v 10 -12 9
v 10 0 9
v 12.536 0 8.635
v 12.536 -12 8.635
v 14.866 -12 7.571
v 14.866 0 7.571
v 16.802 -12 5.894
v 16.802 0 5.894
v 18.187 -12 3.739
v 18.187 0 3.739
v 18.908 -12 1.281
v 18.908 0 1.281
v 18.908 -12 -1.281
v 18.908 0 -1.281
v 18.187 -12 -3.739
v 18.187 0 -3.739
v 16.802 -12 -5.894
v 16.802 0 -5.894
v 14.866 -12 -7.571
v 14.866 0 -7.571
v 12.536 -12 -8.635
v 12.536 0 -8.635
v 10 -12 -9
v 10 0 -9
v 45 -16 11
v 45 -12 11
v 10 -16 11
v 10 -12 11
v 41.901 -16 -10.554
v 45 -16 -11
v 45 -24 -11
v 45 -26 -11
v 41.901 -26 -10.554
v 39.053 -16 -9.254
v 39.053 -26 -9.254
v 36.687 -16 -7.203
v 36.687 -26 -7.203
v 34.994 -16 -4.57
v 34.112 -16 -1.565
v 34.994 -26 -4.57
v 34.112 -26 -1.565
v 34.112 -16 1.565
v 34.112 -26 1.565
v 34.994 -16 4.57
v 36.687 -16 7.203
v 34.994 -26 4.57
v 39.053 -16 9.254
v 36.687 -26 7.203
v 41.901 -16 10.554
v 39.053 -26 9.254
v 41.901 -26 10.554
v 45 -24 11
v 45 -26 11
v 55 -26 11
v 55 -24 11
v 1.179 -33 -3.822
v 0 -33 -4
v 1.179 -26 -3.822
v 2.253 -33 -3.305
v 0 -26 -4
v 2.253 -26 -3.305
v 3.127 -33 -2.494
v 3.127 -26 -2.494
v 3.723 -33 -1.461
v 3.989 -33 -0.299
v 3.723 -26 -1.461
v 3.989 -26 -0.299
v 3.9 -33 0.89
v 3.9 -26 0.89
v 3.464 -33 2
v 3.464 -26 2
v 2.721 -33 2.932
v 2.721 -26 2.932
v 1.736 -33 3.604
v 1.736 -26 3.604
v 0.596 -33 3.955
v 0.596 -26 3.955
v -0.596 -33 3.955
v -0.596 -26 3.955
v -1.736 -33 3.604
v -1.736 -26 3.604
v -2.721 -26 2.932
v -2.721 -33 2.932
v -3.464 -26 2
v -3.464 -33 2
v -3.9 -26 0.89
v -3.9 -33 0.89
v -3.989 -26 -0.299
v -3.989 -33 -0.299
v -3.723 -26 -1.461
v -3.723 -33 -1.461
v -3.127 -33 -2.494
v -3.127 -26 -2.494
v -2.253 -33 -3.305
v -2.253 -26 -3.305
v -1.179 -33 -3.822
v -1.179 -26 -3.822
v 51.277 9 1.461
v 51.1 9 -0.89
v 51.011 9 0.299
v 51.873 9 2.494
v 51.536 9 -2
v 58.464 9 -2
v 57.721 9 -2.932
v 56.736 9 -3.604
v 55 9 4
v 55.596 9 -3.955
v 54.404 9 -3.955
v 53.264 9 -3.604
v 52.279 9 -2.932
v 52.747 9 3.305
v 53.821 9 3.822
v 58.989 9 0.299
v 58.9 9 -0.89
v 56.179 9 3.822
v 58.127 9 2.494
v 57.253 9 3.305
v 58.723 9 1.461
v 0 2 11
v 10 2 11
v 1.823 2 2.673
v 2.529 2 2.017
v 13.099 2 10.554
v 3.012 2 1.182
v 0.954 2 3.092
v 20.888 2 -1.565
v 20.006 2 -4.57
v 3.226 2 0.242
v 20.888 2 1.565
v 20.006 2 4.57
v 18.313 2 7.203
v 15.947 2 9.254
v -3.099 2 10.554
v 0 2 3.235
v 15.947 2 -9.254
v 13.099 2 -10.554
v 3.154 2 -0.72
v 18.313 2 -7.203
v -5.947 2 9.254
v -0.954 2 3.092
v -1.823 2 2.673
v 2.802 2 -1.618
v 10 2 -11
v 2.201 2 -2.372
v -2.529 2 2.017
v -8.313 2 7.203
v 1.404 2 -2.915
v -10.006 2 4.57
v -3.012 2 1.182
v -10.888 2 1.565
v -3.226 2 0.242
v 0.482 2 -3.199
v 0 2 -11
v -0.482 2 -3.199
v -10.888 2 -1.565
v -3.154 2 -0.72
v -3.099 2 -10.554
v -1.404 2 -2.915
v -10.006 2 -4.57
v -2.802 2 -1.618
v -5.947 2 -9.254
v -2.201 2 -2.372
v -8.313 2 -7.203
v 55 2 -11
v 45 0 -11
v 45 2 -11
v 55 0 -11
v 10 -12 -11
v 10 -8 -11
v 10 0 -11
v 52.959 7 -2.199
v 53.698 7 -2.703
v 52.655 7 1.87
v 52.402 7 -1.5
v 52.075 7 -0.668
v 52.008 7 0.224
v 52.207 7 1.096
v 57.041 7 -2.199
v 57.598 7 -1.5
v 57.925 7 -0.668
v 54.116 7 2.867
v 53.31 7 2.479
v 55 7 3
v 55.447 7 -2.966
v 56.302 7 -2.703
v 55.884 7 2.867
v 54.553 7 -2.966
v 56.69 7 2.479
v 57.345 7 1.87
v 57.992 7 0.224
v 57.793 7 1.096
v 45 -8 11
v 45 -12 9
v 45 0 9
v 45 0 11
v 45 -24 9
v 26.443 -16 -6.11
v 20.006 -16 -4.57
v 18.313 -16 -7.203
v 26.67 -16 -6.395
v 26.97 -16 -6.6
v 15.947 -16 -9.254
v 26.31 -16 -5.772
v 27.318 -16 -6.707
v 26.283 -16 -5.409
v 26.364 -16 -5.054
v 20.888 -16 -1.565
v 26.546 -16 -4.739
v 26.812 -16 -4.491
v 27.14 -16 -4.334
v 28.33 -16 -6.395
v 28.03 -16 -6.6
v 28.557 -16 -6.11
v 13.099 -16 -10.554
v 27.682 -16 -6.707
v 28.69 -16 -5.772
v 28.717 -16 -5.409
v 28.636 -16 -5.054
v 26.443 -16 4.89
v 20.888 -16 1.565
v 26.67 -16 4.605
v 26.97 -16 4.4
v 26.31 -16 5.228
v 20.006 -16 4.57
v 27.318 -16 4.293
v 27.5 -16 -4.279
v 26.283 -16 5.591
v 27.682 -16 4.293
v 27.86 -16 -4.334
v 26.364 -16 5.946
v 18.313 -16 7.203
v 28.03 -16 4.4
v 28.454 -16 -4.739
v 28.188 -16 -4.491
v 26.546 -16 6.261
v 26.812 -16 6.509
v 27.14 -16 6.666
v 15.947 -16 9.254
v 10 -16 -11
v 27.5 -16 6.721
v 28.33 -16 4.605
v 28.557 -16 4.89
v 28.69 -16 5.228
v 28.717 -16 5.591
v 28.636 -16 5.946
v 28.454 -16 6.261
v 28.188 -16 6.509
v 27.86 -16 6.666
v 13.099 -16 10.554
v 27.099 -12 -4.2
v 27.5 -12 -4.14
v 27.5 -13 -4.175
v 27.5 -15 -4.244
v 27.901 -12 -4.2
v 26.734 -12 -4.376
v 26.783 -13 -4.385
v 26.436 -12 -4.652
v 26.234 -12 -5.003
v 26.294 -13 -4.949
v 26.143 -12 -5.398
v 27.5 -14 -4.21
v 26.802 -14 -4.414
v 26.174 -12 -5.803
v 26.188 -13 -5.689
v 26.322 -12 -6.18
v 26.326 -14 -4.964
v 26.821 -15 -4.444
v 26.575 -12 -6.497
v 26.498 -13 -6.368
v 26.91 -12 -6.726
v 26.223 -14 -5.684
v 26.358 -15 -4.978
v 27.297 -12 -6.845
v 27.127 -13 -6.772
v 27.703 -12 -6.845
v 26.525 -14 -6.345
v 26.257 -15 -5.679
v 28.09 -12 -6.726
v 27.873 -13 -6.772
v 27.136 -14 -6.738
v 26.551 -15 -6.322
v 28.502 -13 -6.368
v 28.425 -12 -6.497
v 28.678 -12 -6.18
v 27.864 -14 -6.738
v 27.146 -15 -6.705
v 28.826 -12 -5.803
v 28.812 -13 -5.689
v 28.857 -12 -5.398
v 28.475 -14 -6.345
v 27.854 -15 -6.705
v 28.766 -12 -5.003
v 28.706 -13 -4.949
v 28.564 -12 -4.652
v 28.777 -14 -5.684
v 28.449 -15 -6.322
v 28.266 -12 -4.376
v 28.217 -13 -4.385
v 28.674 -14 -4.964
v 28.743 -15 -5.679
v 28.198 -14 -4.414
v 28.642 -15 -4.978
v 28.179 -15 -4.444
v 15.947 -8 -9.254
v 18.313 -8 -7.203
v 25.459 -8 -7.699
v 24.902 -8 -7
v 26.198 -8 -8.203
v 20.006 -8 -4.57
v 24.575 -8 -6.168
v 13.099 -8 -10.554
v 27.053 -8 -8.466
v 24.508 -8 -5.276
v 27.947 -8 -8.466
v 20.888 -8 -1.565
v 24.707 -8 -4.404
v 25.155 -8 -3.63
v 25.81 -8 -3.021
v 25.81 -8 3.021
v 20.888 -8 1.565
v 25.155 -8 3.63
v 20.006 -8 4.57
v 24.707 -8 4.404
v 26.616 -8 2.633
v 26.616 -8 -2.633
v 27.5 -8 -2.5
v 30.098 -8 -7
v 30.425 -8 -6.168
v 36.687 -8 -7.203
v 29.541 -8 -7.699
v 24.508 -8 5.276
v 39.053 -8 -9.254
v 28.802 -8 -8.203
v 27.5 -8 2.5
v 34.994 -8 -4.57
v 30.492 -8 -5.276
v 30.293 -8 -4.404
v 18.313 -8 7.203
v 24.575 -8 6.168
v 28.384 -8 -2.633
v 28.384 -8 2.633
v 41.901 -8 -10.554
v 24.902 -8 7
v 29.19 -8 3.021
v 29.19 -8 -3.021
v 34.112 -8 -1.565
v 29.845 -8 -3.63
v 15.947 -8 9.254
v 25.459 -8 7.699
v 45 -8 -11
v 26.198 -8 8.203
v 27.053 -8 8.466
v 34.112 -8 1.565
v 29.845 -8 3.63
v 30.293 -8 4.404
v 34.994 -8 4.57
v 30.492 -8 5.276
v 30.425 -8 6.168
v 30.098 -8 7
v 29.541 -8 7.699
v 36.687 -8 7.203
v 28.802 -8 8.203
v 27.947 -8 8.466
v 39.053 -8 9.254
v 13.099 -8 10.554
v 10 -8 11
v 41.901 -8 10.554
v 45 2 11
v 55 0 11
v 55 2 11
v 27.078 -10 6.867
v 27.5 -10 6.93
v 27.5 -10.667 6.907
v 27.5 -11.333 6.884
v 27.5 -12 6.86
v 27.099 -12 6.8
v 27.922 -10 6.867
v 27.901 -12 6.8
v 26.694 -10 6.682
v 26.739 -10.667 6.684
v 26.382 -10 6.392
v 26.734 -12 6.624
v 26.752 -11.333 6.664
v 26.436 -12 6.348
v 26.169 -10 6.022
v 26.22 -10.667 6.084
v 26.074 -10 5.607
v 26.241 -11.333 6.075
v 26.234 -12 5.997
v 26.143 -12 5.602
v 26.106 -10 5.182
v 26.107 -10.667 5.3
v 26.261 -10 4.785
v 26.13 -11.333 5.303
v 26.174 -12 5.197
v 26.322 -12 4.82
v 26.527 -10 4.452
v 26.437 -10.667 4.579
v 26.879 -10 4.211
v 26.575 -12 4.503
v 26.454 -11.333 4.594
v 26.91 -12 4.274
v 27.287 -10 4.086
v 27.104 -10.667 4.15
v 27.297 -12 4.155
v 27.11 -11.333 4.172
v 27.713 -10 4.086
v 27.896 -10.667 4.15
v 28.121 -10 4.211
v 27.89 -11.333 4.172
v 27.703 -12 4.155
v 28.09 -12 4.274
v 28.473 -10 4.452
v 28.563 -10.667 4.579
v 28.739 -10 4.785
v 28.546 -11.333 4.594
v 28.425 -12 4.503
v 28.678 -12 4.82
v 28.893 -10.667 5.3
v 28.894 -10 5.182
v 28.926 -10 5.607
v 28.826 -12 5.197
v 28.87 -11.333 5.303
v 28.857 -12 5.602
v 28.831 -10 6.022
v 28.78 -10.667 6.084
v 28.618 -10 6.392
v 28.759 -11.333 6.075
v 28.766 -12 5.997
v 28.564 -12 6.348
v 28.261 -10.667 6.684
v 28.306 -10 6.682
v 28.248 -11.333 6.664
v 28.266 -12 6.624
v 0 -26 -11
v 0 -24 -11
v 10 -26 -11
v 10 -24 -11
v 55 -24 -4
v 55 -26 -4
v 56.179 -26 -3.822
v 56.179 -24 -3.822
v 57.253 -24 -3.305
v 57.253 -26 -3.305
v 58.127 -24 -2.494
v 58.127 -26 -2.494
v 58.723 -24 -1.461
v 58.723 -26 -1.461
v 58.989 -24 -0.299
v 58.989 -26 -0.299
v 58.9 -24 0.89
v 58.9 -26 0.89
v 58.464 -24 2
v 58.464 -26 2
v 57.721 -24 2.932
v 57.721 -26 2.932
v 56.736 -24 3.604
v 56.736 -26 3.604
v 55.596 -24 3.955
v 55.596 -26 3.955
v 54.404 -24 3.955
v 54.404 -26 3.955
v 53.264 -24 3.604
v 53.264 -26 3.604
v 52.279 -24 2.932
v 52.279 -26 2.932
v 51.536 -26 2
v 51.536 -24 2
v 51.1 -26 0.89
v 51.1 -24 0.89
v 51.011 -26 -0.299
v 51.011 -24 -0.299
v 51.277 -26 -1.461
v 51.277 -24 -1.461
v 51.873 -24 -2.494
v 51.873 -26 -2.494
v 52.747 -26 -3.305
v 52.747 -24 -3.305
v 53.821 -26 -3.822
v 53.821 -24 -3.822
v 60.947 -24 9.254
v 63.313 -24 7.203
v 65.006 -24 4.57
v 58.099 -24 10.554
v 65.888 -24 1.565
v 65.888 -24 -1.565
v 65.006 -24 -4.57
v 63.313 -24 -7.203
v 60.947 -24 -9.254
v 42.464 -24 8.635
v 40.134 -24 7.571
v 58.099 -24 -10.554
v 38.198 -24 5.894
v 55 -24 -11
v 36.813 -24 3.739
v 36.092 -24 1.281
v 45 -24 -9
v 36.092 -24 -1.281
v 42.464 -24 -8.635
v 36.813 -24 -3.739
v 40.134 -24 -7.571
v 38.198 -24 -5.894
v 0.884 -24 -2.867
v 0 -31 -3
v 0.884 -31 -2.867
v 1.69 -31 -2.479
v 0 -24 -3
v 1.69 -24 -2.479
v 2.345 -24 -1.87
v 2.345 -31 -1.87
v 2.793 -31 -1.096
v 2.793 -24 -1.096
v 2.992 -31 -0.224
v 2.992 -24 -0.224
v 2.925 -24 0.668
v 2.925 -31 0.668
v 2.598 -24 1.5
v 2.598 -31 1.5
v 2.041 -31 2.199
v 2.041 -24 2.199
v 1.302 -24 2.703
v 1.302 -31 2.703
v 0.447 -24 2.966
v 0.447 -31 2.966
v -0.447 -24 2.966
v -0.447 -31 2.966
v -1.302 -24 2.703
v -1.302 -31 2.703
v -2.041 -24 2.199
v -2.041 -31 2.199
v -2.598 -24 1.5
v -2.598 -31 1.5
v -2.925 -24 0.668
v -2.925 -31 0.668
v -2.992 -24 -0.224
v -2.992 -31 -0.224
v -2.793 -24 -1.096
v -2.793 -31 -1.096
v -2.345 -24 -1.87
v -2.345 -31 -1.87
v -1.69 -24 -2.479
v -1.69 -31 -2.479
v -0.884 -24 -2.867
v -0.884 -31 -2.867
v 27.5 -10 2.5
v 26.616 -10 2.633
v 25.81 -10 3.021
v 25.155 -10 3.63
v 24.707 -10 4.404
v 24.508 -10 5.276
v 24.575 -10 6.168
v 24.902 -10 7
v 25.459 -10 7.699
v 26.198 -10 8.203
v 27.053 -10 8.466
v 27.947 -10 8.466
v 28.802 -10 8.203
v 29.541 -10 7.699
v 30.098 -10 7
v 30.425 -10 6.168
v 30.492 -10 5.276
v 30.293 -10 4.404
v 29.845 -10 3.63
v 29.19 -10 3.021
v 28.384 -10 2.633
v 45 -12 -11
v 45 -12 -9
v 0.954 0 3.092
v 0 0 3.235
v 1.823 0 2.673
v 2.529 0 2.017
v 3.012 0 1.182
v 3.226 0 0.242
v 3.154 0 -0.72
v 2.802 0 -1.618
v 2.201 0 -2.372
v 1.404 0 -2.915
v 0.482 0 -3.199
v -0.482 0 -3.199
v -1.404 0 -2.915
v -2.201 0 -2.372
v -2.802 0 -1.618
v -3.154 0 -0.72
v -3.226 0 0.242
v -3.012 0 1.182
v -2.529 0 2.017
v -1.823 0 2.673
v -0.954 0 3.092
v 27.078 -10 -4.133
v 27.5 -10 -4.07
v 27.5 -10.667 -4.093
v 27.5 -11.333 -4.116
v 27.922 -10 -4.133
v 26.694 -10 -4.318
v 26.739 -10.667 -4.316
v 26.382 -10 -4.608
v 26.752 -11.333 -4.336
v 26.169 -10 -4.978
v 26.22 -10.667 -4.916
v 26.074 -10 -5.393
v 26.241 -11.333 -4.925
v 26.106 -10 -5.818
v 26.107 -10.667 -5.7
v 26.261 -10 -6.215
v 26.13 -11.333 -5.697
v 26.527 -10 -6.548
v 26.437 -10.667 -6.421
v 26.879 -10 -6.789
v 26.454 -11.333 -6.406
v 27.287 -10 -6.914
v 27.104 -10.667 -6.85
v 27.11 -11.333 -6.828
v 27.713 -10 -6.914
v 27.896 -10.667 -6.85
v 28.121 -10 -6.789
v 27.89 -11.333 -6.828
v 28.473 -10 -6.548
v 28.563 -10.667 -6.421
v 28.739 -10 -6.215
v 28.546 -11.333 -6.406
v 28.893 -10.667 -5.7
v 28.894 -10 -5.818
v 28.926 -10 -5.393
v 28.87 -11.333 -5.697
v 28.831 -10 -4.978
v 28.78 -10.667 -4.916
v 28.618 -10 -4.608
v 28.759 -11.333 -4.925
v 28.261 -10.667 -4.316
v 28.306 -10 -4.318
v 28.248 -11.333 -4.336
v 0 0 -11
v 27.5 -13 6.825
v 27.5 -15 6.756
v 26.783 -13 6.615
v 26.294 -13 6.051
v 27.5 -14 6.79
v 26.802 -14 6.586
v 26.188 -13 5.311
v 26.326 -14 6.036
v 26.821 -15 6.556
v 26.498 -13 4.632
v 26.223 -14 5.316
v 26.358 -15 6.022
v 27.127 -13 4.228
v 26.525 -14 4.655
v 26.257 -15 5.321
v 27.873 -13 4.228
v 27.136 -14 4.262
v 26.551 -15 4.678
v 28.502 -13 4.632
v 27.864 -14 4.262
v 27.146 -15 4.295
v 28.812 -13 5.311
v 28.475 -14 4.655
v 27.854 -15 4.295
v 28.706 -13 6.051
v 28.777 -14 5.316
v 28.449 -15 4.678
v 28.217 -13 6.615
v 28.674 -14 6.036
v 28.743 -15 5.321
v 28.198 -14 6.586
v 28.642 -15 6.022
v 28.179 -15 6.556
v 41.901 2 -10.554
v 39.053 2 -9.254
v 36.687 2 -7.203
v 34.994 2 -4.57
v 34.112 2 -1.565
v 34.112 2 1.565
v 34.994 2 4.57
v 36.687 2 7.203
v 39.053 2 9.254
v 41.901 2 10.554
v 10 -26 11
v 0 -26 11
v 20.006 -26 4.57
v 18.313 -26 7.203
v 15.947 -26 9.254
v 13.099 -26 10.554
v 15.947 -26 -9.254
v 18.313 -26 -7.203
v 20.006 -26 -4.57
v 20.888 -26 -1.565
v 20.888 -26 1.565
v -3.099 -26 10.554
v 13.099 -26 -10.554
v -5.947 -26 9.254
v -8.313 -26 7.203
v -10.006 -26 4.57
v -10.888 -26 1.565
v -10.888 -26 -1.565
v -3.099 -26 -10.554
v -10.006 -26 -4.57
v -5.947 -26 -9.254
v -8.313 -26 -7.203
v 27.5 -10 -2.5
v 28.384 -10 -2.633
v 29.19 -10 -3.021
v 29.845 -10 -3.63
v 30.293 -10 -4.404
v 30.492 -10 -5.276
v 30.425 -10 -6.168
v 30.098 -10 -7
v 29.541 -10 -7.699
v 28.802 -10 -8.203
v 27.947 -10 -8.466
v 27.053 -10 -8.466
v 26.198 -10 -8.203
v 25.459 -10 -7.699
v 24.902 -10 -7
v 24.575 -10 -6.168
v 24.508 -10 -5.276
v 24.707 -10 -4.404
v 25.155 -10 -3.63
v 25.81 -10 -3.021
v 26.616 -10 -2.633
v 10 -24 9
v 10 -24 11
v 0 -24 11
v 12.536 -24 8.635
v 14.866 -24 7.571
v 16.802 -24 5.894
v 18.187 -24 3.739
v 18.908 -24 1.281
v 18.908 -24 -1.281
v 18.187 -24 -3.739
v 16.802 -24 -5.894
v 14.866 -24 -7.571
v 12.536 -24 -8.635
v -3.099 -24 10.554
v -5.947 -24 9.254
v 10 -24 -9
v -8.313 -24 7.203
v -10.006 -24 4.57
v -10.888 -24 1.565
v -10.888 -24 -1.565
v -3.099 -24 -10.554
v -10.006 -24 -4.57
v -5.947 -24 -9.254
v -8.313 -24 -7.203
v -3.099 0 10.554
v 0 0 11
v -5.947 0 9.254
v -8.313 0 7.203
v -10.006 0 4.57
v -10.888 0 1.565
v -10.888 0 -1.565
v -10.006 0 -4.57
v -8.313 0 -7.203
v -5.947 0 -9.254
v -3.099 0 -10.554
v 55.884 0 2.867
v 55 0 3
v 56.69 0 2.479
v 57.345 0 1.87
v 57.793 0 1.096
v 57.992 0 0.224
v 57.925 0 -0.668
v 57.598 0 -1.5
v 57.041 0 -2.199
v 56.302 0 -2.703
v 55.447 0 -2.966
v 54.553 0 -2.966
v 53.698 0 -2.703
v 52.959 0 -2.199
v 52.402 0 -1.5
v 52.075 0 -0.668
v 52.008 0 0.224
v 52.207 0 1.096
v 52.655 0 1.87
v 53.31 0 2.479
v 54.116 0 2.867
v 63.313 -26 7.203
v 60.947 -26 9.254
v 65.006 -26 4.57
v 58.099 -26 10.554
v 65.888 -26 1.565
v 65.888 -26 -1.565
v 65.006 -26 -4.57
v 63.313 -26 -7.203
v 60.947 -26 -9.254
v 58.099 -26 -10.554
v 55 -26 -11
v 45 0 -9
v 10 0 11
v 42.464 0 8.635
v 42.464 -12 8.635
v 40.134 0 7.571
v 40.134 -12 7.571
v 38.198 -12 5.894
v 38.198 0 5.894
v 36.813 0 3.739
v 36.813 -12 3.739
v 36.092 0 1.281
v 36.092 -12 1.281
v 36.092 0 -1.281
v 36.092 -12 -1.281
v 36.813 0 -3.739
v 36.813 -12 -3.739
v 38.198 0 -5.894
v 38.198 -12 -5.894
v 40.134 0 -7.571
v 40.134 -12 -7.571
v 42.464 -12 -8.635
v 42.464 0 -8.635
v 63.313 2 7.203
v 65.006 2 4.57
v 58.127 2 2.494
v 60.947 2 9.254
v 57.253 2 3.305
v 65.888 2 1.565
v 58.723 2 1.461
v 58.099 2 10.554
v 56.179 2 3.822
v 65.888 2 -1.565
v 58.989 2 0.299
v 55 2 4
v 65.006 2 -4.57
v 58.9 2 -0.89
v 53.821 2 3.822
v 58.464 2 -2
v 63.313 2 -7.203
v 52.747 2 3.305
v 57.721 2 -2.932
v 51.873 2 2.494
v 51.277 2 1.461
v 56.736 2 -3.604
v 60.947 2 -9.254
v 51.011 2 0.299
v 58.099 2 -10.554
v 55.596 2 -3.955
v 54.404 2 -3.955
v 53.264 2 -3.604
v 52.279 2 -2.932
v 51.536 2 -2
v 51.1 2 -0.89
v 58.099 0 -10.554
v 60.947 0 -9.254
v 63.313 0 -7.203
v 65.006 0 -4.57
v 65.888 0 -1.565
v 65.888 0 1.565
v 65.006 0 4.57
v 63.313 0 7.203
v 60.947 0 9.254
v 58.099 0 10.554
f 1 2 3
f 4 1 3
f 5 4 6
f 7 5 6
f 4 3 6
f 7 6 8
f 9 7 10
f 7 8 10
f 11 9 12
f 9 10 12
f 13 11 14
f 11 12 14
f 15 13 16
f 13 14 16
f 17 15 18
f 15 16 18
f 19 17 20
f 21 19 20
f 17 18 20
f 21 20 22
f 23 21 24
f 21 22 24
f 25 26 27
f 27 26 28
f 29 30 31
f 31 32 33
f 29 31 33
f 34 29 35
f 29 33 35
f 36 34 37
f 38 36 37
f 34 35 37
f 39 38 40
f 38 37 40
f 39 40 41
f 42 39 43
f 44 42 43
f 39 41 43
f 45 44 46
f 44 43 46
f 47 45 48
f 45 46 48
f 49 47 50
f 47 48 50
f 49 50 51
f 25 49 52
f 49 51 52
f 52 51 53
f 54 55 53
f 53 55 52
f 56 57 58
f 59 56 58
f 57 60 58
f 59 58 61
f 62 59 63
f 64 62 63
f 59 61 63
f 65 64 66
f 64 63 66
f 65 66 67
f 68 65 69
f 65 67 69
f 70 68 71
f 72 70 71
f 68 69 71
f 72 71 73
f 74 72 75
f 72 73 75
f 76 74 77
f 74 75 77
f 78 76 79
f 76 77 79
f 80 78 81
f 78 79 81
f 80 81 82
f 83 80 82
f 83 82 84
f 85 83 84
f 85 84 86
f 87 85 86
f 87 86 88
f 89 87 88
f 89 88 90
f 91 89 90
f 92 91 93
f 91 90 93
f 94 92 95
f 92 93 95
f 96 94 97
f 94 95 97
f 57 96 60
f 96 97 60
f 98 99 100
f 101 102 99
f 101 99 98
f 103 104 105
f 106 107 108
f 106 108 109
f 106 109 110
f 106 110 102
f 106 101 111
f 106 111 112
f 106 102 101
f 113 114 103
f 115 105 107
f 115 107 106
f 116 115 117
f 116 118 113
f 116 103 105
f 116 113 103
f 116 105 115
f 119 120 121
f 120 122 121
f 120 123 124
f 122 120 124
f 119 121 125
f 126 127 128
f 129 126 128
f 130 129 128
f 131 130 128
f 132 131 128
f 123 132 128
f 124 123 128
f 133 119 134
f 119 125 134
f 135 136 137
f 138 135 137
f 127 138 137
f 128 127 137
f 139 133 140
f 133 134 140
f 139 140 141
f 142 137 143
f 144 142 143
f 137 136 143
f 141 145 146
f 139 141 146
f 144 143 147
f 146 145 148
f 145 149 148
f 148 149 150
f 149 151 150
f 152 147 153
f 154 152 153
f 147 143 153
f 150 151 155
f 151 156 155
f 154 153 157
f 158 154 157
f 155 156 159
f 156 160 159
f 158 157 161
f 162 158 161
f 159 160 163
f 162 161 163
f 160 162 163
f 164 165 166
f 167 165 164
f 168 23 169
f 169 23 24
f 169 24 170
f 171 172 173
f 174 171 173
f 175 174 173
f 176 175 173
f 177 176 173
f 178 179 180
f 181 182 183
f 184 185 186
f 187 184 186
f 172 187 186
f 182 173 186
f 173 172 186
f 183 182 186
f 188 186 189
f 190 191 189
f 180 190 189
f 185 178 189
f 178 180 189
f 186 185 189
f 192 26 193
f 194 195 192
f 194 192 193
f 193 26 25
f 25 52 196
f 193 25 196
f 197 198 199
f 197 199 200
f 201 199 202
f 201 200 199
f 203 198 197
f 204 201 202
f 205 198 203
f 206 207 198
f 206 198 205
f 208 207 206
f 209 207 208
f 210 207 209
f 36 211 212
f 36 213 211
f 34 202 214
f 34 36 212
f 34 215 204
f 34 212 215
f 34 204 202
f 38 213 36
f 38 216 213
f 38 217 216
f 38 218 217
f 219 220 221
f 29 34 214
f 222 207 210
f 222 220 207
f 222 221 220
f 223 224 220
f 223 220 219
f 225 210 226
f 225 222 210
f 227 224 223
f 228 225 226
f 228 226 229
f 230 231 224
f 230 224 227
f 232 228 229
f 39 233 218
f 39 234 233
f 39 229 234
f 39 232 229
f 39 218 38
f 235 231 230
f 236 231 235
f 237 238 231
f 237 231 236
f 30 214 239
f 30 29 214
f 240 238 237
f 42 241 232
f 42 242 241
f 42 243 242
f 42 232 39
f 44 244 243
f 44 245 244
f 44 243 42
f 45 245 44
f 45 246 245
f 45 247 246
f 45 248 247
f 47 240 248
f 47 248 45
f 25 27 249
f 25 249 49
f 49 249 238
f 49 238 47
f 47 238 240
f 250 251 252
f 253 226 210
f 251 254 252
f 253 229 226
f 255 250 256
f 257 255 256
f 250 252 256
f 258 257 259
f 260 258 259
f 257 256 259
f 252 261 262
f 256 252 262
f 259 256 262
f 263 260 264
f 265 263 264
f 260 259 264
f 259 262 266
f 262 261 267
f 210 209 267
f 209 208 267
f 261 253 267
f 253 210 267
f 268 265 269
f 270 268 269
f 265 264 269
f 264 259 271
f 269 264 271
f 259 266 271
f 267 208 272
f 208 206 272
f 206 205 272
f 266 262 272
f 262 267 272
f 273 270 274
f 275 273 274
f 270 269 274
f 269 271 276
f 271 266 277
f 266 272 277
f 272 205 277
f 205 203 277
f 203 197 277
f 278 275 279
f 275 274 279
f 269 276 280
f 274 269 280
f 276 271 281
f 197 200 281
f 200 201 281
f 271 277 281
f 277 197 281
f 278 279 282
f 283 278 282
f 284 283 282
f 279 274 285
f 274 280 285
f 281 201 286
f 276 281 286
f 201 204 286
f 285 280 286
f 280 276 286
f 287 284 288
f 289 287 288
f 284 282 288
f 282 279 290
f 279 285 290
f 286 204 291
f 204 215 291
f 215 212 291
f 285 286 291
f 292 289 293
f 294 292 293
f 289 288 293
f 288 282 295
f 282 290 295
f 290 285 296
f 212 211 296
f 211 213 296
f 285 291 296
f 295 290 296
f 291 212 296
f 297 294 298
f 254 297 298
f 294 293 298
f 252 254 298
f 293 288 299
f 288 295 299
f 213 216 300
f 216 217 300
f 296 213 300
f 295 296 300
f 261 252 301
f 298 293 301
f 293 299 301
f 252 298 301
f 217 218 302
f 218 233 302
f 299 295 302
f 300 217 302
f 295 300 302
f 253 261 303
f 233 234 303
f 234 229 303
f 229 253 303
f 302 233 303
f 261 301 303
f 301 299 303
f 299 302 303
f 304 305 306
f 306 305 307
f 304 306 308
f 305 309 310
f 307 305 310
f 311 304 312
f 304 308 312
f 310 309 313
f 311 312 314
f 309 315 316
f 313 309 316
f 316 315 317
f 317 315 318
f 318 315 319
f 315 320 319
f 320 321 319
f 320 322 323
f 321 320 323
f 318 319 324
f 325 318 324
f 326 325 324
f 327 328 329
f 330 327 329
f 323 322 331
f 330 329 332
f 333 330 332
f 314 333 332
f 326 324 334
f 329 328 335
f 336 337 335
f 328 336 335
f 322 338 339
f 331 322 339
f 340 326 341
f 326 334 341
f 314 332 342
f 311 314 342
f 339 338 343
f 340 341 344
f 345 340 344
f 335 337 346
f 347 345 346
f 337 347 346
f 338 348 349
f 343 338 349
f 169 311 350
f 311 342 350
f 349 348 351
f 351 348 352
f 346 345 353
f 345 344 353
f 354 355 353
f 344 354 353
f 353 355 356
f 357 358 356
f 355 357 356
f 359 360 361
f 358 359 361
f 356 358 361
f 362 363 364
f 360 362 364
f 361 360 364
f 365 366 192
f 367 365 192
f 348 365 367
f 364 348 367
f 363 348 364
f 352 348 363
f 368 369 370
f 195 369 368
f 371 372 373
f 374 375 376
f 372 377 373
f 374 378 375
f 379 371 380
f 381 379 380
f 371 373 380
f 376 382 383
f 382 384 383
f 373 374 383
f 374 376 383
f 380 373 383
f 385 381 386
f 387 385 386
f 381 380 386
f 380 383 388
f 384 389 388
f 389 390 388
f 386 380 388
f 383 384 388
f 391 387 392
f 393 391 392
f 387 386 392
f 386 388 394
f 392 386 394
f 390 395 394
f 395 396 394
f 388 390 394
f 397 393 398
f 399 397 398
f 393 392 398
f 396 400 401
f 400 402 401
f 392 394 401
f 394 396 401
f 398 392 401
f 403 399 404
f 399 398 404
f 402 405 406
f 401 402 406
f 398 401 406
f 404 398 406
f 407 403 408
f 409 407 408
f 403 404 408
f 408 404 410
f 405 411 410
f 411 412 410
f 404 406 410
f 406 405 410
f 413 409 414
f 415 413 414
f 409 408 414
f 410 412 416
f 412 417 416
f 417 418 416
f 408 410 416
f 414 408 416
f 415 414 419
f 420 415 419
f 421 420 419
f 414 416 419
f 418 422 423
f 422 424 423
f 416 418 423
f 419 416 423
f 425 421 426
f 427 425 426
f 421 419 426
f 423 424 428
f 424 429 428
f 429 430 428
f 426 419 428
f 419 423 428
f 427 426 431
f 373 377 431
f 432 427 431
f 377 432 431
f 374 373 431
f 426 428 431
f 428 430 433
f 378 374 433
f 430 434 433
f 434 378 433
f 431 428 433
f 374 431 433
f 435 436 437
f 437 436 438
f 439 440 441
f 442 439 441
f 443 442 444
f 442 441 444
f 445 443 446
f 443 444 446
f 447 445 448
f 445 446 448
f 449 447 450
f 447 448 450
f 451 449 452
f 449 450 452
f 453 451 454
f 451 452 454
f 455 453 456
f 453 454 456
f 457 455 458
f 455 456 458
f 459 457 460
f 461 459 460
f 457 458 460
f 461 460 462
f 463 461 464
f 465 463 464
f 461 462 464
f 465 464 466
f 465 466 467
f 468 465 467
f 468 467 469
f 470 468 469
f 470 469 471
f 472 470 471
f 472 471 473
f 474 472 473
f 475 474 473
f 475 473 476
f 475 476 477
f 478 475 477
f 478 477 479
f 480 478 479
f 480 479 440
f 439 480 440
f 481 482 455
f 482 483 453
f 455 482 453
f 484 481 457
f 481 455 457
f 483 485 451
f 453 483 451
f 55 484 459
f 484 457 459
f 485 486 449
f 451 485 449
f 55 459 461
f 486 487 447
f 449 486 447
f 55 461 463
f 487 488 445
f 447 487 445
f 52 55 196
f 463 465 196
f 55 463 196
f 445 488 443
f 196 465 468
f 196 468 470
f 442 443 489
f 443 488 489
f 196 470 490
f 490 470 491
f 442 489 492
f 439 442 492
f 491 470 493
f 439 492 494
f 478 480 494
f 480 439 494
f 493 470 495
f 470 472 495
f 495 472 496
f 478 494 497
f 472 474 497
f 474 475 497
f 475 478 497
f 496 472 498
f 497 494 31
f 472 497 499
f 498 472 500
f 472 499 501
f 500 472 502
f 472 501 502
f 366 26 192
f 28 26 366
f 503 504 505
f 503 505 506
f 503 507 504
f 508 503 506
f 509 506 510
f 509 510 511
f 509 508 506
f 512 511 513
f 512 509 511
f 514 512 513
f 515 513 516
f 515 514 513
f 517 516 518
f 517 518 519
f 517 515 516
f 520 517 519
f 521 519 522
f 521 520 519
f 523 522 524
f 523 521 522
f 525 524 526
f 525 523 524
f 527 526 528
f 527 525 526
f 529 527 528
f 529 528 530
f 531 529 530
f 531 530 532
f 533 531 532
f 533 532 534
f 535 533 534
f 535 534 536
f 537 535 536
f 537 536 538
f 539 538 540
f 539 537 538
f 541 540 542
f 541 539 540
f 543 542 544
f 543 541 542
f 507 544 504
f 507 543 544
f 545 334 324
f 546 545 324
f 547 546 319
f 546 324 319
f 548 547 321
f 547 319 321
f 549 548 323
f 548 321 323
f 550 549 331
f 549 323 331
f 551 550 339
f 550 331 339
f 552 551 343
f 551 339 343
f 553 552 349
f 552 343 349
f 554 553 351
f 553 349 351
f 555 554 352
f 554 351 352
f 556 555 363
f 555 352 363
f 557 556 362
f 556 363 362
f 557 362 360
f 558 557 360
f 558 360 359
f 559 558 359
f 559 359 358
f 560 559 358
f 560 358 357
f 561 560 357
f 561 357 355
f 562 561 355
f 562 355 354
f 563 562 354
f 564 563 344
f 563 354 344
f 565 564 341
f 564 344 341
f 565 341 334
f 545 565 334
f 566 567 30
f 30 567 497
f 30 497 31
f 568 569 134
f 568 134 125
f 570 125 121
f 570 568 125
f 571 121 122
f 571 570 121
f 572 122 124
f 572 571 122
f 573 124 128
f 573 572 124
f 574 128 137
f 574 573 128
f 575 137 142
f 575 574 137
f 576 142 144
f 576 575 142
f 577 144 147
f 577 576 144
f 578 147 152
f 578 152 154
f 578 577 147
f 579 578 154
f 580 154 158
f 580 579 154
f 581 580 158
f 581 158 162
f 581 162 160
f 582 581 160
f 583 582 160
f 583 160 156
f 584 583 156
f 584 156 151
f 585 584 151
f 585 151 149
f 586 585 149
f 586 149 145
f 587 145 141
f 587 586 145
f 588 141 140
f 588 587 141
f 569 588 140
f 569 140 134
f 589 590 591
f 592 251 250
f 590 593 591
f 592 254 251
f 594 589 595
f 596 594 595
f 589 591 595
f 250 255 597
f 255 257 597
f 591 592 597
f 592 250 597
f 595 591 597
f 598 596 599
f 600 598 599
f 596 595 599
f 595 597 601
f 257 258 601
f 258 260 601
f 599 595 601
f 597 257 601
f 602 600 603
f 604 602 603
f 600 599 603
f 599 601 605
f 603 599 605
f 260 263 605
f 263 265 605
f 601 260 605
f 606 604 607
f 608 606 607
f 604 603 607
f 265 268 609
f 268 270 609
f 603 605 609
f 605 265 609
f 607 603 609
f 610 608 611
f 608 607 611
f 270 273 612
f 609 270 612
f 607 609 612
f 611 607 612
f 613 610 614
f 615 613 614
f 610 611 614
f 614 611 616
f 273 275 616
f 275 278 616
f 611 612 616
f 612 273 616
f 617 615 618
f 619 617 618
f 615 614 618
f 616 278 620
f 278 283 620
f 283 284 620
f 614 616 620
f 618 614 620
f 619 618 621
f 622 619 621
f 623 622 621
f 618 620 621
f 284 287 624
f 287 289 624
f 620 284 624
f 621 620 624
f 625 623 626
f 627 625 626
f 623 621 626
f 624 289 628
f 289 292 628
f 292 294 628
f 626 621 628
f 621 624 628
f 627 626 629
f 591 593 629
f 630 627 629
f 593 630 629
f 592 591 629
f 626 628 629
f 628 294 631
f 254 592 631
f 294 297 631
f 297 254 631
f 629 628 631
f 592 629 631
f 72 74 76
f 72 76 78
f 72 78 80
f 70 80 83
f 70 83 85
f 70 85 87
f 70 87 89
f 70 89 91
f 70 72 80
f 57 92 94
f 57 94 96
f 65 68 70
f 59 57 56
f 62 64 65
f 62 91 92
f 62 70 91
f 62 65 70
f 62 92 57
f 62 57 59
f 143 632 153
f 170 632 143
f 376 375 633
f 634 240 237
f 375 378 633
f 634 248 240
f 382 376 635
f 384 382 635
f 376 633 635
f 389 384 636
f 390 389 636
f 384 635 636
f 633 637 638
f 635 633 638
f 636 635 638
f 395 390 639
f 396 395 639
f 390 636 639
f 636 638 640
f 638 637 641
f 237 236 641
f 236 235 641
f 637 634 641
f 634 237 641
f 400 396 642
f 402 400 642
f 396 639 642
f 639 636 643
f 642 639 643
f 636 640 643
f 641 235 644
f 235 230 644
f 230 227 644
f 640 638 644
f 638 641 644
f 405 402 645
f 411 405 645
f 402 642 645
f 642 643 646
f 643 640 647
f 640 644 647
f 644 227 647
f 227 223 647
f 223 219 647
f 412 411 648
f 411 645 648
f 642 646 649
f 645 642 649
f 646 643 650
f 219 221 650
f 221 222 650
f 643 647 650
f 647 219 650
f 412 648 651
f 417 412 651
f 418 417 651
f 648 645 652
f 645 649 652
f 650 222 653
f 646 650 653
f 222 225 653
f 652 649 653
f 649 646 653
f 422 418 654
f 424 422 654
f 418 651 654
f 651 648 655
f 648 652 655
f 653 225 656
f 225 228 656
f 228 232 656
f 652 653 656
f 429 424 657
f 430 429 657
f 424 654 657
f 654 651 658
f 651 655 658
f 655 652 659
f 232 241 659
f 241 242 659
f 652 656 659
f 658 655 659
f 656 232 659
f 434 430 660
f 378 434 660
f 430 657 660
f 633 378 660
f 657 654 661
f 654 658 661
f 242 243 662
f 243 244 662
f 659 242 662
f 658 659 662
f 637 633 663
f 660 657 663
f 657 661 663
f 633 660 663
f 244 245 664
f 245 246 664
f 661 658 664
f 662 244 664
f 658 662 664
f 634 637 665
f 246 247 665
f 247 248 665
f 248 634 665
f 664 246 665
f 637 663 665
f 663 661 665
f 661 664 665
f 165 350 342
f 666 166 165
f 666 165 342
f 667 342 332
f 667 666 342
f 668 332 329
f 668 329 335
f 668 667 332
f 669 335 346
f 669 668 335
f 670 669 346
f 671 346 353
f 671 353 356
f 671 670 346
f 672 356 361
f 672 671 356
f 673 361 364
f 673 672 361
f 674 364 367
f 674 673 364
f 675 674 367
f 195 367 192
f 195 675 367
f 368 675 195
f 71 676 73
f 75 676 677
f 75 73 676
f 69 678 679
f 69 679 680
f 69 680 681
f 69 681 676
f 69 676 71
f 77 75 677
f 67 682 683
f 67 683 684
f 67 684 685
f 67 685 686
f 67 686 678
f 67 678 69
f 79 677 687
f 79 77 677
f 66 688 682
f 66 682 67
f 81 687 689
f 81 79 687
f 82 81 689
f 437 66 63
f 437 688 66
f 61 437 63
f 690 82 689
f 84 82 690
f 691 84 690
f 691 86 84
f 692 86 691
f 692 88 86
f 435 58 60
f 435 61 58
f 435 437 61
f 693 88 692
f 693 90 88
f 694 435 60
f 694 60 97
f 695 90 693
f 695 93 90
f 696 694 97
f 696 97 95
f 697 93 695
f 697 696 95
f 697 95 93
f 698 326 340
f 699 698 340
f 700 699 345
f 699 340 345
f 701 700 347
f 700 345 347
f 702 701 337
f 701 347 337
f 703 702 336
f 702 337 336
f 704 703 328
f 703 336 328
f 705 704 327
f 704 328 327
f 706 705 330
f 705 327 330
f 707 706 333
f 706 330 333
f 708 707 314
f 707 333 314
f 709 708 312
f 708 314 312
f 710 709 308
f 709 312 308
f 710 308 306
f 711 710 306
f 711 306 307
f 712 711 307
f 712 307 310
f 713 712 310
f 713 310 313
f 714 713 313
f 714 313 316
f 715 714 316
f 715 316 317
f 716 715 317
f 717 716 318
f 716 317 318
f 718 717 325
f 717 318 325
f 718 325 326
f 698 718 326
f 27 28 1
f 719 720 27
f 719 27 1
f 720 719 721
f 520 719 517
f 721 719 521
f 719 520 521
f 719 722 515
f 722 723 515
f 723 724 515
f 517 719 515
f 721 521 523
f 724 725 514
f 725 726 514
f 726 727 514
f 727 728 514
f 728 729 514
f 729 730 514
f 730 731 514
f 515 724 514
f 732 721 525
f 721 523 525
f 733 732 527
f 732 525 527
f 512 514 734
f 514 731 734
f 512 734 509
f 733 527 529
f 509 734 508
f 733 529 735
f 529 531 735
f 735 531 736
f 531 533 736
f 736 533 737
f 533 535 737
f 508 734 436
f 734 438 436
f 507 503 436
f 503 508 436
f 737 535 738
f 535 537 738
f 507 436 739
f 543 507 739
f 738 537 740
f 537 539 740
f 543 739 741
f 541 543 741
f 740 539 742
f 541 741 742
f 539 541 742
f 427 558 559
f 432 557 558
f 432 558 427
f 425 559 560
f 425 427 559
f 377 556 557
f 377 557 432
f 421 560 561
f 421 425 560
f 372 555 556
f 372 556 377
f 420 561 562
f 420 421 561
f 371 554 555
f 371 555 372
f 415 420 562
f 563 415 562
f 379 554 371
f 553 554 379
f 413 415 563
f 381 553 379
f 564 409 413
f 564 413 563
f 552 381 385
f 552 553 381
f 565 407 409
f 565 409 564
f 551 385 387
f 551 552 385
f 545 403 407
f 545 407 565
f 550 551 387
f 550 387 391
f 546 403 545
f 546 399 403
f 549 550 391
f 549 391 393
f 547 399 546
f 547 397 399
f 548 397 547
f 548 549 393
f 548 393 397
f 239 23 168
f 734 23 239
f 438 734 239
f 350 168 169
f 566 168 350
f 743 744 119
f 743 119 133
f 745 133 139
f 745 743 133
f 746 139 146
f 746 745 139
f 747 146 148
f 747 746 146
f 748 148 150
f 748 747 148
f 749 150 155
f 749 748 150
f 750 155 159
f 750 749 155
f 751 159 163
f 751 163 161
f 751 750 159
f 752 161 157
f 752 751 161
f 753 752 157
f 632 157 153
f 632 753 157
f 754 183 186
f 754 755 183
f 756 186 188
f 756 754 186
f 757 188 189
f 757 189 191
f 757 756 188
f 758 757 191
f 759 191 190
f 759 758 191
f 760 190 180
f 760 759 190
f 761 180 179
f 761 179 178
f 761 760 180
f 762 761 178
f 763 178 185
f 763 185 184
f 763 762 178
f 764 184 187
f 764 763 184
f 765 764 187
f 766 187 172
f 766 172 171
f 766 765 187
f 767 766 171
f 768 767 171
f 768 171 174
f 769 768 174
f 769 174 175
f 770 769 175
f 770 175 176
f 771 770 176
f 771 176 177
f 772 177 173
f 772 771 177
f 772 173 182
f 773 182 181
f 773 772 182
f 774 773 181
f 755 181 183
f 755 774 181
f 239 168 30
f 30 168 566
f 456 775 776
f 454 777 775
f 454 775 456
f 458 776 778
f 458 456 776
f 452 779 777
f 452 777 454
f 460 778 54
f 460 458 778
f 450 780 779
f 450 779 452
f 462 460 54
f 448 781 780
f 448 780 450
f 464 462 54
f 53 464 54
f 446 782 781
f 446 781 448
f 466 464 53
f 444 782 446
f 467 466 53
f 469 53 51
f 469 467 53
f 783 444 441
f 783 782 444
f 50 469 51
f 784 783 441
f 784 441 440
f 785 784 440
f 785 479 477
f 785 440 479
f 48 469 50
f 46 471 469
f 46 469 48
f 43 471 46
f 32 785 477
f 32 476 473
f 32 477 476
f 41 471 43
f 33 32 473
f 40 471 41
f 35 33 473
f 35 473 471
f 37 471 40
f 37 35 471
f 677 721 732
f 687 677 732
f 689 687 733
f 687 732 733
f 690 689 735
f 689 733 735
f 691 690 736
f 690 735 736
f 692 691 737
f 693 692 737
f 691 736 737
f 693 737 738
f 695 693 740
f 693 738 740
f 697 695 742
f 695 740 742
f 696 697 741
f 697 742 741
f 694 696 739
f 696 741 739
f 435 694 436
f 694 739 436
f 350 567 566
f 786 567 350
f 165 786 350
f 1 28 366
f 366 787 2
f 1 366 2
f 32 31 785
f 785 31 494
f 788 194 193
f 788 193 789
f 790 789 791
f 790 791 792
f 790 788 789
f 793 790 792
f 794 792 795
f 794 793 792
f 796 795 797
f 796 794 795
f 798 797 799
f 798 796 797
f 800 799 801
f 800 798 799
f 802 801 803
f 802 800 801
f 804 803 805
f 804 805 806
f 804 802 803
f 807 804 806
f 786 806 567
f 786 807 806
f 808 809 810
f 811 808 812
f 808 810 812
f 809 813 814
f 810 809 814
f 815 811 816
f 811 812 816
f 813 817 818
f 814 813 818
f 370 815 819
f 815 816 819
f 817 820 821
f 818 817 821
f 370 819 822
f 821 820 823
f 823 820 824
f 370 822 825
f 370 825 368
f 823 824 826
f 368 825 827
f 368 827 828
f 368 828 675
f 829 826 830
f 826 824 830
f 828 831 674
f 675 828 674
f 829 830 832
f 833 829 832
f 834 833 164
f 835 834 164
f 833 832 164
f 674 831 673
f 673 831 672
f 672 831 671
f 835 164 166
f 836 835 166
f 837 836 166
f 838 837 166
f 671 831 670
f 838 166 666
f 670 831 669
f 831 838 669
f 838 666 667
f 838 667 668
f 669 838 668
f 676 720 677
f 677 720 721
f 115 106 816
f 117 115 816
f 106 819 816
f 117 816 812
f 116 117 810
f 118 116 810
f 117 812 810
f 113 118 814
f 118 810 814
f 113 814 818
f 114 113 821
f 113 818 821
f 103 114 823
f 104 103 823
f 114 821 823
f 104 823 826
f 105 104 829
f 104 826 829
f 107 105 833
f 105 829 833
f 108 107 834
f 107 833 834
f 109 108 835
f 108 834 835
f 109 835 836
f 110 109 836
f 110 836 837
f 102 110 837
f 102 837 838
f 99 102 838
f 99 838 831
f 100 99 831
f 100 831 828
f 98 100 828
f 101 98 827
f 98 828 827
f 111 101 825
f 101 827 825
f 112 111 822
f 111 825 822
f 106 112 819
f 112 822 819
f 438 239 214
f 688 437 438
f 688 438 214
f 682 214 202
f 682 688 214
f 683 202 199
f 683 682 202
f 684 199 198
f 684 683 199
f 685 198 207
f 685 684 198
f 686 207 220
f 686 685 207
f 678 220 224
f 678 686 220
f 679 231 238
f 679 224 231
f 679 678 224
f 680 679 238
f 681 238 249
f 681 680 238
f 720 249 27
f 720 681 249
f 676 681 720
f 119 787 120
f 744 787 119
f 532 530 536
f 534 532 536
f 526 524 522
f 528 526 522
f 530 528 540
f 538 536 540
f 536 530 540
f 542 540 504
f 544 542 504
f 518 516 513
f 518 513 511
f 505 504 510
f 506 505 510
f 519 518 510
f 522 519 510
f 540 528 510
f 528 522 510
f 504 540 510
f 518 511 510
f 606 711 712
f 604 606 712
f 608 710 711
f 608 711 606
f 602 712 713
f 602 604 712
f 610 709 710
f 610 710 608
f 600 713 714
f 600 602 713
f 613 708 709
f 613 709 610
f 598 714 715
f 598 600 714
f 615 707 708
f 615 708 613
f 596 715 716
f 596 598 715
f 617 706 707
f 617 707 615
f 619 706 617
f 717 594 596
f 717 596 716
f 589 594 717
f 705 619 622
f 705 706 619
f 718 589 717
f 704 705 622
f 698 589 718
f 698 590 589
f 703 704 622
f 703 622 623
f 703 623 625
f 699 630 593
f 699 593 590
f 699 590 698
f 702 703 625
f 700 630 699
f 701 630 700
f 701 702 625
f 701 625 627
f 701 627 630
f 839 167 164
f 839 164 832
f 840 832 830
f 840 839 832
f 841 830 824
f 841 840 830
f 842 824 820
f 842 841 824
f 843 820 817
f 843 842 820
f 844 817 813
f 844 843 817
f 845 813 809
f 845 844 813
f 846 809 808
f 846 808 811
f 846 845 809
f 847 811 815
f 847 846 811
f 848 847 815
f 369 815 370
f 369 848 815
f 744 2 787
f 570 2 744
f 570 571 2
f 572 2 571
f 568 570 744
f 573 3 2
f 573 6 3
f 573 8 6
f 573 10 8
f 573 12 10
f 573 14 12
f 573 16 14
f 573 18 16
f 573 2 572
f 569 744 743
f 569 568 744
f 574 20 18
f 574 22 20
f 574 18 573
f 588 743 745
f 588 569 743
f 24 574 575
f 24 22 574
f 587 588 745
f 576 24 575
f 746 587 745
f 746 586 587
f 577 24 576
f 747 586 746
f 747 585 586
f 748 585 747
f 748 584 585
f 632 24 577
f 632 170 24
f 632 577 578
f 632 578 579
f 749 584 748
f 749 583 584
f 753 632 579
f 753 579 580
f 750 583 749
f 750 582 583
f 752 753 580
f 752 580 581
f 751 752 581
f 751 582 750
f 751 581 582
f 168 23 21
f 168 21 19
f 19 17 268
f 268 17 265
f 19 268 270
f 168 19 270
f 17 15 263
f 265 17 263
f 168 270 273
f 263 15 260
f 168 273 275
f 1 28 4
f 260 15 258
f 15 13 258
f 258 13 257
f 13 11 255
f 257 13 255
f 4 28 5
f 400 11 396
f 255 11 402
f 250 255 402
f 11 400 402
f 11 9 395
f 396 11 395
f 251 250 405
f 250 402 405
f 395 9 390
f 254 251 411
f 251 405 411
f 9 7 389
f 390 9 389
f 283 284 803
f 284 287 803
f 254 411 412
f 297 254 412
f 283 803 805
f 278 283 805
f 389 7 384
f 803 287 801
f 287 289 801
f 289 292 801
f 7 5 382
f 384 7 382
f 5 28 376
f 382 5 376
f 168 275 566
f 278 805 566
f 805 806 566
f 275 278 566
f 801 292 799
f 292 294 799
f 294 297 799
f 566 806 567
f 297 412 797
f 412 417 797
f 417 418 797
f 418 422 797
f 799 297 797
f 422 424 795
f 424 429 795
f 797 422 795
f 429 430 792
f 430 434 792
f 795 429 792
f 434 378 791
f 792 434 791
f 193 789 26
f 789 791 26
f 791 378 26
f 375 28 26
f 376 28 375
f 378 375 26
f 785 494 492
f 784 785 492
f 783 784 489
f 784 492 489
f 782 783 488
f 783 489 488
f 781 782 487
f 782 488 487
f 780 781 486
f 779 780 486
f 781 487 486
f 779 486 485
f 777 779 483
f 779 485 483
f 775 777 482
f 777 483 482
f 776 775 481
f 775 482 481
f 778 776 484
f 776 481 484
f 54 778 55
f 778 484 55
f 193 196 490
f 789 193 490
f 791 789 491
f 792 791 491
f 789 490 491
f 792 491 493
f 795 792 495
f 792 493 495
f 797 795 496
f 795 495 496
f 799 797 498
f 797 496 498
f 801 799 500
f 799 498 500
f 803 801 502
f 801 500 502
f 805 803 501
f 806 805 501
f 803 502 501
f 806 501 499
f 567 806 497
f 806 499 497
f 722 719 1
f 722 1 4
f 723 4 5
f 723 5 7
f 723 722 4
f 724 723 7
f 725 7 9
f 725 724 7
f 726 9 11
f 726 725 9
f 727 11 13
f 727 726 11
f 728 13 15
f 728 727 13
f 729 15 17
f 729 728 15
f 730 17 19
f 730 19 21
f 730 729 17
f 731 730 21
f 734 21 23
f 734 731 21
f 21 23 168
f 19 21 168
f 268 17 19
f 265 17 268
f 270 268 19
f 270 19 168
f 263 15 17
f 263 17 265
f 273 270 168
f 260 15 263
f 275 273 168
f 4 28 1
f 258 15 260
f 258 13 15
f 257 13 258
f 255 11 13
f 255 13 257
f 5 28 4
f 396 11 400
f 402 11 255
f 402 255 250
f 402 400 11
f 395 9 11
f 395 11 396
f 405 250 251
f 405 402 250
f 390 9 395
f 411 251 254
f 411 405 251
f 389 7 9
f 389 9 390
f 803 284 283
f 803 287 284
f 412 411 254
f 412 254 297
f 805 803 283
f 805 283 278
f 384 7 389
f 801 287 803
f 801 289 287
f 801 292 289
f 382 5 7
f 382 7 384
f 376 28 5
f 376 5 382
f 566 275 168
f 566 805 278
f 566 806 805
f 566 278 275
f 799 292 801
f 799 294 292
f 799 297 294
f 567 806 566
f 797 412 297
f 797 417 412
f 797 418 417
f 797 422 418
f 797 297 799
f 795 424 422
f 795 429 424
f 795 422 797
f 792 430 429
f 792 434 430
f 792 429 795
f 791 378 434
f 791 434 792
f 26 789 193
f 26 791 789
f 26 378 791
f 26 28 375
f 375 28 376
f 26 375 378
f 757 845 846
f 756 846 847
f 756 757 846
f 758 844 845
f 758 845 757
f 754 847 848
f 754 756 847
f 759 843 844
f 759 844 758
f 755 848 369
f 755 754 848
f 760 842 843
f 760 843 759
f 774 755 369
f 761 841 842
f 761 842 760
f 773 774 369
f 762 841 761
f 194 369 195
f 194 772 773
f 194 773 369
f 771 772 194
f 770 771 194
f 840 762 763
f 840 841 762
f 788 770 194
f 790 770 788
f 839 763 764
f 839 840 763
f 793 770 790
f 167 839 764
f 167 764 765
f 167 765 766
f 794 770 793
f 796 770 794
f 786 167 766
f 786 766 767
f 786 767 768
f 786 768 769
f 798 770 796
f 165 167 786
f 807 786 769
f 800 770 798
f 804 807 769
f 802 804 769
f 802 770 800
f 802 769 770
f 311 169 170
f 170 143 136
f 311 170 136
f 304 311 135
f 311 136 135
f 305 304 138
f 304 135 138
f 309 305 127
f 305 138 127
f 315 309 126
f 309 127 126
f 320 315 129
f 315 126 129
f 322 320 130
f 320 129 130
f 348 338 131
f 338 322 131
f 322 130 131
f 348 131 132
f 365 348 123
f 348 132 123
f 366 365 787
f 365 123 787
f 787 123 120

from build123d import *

# Parameters (mm, degrees)
SKETCH1_R           = 3.235333301
SKETCH1_R_2         = 3
BOSS_EXTRUDE1_DEPTH = 2
CUT_EXTRUDE1_DEPTH  = 2
BOSS_EXTRUDE2_DEPTH = 12
BOSS_EXTRUDE3_DEPTH = 4
SKETCH5_R           = 4
SKETCH5_R_2         = 3
BOSS_EXTRUDE4_DEPTH = 5
SKETCH6_R           = 4
BOSS_EXTRUDE5_DEPTH = 2
SKETCH7_R           = 3.754027052
SKETCH7_R_2         = 3
BOSS_EXTRUDE6_DEPTH = 2
SKETCH9_R           = 4
SKETCH9_R_2         = 3
BOSS_EXTRUDE7_DEPTH = 5
SKETCH10_R          = 4
BOSS_EXTRUDE8_DEPTH = 2
SKETCH12_R          = 3.936333862
SKETCH12_R_2        = 3
BOSS_EXTRUDE9_DEPTH = 2
SKETCH14_R          = 4
CUT_EXTRUDE3_DEPTH  = 5
SKETCH15_R          = 4
CUT_EXTRUDE4_DEPTH  = 5
SKETCH17_R          = 3
CUT_EXTRUDE6_DEPTH  = 2


with BuildPart() as part:
    # Sketch1 → Boss-Extrude1 (new body)
    with BuildSketch(Plane(origin=(0, 0, 0), x_dir=(1, 0, 0), z_dir=(0, 1, 0))):
        with BuildLine():
            Line((0, 11), (55, 11))
            ThreePointArc((55, 11), (66, 0), (55, -11))
            Line((55, -11), (0, -11))
            ThreePointArc((0, -11), (-11, 0), (0, 11))
        make_face()
        with Locations(Location((0, 0, 0), (0, 0, 270))):
            Circle(SKETCH1_R, mode=Mode.SUBTRACT)
        with Locations(Location((55, 0, 0), (0, 0, 270))):
            Circle(SKETCH1_R_2, mode=Mode.SUBTRACT)
    extrude(amount=BOSS_EXTRUDE1_DEPTH)

    # Sketch2 → Cut-Extrude1 (cut)
    with BuildSketch(Plane.XZ):
        with BuildLine():
            Line((10, 11), (45, 11))
            ThreePointArc((45, 11), (34, 0), (45, -11))
            Line((45, -11), (10, -11))
            ThreePointArc((10, -11), (21, 0), (10, 11))
        make_face()
    extrude(amount=-CUT_EXTRUDE1_DEPTH, mode=Mode.SUBTRACT)


with BuildPart() as cut_extrude1_piece_1:
    # of the separate pieces the step leaves, piece 1, a body of its own (cut_extrude1_pieces)
    add(part.part.solids().sort_by_distance((45, 0, -11))[0])



with BuildPart() as cut_extrude1_piece_2:
    # of the separate pieces the step leaves, piece 2, a body of its own (cut_extrude1_pieces)
    add(part.part.solids().sort_by_distance((0, 0, -11))[0])


with BuildPart() as cut_extrude1_piece_1_1:
    add(cut_extrude1_piece_1.part)

    add(cut_extrude1_piece_2.part)  # Boss-Extrude2 merges Cut-Extrude1 piece 2
    # Sketch3 → Boss-Extrude2 (add)
    with BuildSketch(Plane.XZ):
        with BuildLine():
            Line((45, 11), (45, 9))
            ThreePointArc((45, 9), (36, 0), (45, -9))
            Line((45, -9), (45, -11))
            ThreePointArc((45, -11), (34, 0), (45, 11))
        make_face()
        with BuildLine():
            Line((10, 11), (10, 9))
            ThreePointArc((10, 9), (19, 0), (10, -9))
            Line((10, -9), (10, -11))
            ThreePointArc((10, -11), (21, 0), (10, 11))
        make_face()
    extrude(amount=BOSS_EXTRUDE2_DEPTH)

    # Sketch4 → Boss-Extrude3 (add)
    with BuildSketch(Plane.XZ.offset(12)):
        with BuildLine():
            Line((10, -9), (10, -11))
            Line((10, -11), (45, -11))
            Line((45, -11), (45, -9))
            ThreePointArc((45, -9), (36, 0), (45, 9))
            Line((45, 9), (45, 11))
            Line((45, 11), (10, 11))
            Line((10, 11), (10, 9))
            ThreePointArc((10, 9), (19, 0), (10, -9))
        make_face()
    extrude(amount=-BOSS_EXTRUDE3_DEPTH)


with BuildPart() as body_2:
    # Mirror2: mirrored copy
    add(cut_extrude1_piece_1_1.part.mirror(Plane(origin=(0, -12, 0), x_dir=(0, 0, 1), z_dir=(0, -1, 0))))

    # Sketch7 → Boss-Extrude6 (add)
    with BuildSketch(Plane.XZ.offset(26)):
        Circle(SKETCH7_R)
        with Locations(Location((0, 0, 0), (0, 0, 270))):
            Circle(SKETCH7_R_2, mode=Mode.SUBTRACT)
    extrude(amount=-BOSS_EXTRUDE6_DEPTH)

    # Sketch9 → Boss-Extrude7 (add)
    with BuildSketch(Plane.XZ.offset(26)):
        with Locations(Location((0, 0, 0), (0, 0, 270))):
            Circle(SKETCH9_R)
        with Locations(Location((0, 0, 0), (0, 0, 270))):
            Circle(SKETCH9_R_2, mode=Mode.SUBTRACT)
    extrude(amount=BOSS_EXTRUDE7_DEPTH)

    # Sketch10 → Boss-Extrude8 (add)
    with BuildSketch(Plane.XZ.offset(31)):
        with Locations(Location((0, 0, 0), (0, 0, 270))):
            Circle(SKETCH10_R)
    extrude(amount=BOSS_EXTRUDE8_DEPTH)

    # Sketch15 → Cut-Extrude4 (cut)
    with BuildSketch(Plane.XZ.offset(26)):
        with Locations(Location((55, 0, 0), (0, 0, 270))):
            Circle(SKETCH15_R)
    extrude(amount=-CUT_EXTRUDE4_DEPTH, mode=Mode.SUBTRACT)


with BuildPart() as cut_extrude1_piece_1_2:
    add(cut_extrude1_piece_1_1.part)

    # Sketch5 → Boss-Extrude4 (add)
    with BuildSketch(Plane(origin=(0, 2, 0), x_dir=(1, 0, 0), z_dir=(0, 1, 0))):
        with Locations(Location((55, 0, 0), (0, 0, 270))):
            Circle(SKETCH5_R)
        with Locations(Location((55, 0, 0), (0, 0, 270))):
            Circle(SKETCH5_R_2, mode=Mode.SUBTRACT)
    extrude(amount=BOSS_EXTRUDE4_DEPTH)

    # Sketch6 → Boss-Extrude5 (add)
    with BuildSketch(Plane(origin=(0, 7, 0), x_dir=(1, 0, 0), z_dir=(0, 1, 0))):
        with Locations(Location((55, 0, 0), (0, 0, 270))):
            Circle(SKETCH6_R)
    extrude(amount=BOSS_EXTRUDE5_DEPTH)


with BuildPart() as body_3:
    # Sketch12 → Boss-Extrude9 (new body)
    with BuildSketch(Plane(origin=(0, 2, 0), x_dir=(1, 0, 0), z_dir=(0, 1, 0))):
        with Locations(Location((0, 0, 0), (0, 0, 270))):
            Circle(SKETCH12_R)
        with Locations(Location((0, 0, 0), (0, 0, 90))):
            Circle(SKETCH12_R_2, mode=Mode.SUBTRACT)
    extrude(amount=-BOSS_EXTRUDE9_DEPTH)

    # Sketch14 → Cut-Extrude3 (cut)
    with BuildSketch(Plane(origin=(0, 2, 0), x_dir=(1, 0, 0), z_dir=(0, 1, 0))):
        with Locations(Location((0, 0, 0), (0, 0, 90))):
            Circle(SKETCH14_R)
    extrude(amount=-CUT_EXTRUDE3_DEPTH, mode=Mode.SUBTRACT)


with BuildPart() as cut_extrude5_tool:
    # Cut-Extrude5 cone 1 section (through the dimple's axis) → Cut-Extrude5 (revolve)
    with BuildSketch(Plane(origin=(27.5, -8, -5.5), x_dir=(0, 0, 1), z_dir=(1, 0, 0))):
        Polygon((0, 0), (1.5, 0), (0, 42.954379924), align=None)
    revolve(axis=Axis((27.5, -8, -5.5), (0, -1, 0)))


with BuildPart() as cut_extrude1_piece_1_3:
    add(cut_extrude1_piece_1_2.part)

    # Cut-Extrude5: cut by cut_extrude5_tool
    add(cut_extrude5_tool.part, mode=Mode.SUBTRACT)


with BuildPart() as body_2_1:
    add(body_2.part)

    # Cut-Extrude5: cut by cut_extrude5_tool
    add(cut_extrude5_tool.part, mode=Mode.SUBTRACT)


with BuildPart() as cut_extrude5_cone_2_tool:
    # Cut-Extrude5 cone 2 section (through the dimple's axis) → Cut-Extrude5 cone 2 (revolve)
    with BuildSketch(Plane(origin=(27.5, -8, 5.5), x_dir=(0, 0, 1), z_dir=(1, 0, 0))):
        Polygon((0, 0), (1.5, 0), (0, 42.954379924), align=None)
    revolve(axis=Axis((27.5, -8, 5.5), (0, -1, 0)))


with BuildPart() as cut_extrude1_piece_1_4:
    add(cut_extrude1_piece_1_3.part)

    # Cut-Extrude5 cone 2: cut by cut_extrude5_cone_2_tool
    add(cut_extrude5_cone_2_tool.part, mode=Mode.SUBTRACT)

    # Sketch17 → Cut-Extrude6 (cut)
    with BuildSketch(Plane(origin=(0, -8, 0), x_dir=(1, 0, 0), z_dir=(0, 1, 0))):
        with Locations(Location((27.5, 5.5, 0), (0, 0, 270))):
            Circle(SKETCH17_R)
        with Locations(Location((27.5, -5.5, 0), (0, 0, 90))):
            Circle(SKETCH17_R)
    extrude(amount=-CUT_EXTRUDE6_DEPTH, mode=Mode.SUBTRACT)


with BuildPart() as body_2_2:
    add(body_2_1.part)

    # Cut-Extrude5 cone 2: cut by cut_extrude5_cone_2_tool
    add(cut_extrude5_cone_2_tool.part, mode=Mode.SUBTRACT)


solid = Compound([cut_extrude1_piece_1_4.part, body_2_2.part])
